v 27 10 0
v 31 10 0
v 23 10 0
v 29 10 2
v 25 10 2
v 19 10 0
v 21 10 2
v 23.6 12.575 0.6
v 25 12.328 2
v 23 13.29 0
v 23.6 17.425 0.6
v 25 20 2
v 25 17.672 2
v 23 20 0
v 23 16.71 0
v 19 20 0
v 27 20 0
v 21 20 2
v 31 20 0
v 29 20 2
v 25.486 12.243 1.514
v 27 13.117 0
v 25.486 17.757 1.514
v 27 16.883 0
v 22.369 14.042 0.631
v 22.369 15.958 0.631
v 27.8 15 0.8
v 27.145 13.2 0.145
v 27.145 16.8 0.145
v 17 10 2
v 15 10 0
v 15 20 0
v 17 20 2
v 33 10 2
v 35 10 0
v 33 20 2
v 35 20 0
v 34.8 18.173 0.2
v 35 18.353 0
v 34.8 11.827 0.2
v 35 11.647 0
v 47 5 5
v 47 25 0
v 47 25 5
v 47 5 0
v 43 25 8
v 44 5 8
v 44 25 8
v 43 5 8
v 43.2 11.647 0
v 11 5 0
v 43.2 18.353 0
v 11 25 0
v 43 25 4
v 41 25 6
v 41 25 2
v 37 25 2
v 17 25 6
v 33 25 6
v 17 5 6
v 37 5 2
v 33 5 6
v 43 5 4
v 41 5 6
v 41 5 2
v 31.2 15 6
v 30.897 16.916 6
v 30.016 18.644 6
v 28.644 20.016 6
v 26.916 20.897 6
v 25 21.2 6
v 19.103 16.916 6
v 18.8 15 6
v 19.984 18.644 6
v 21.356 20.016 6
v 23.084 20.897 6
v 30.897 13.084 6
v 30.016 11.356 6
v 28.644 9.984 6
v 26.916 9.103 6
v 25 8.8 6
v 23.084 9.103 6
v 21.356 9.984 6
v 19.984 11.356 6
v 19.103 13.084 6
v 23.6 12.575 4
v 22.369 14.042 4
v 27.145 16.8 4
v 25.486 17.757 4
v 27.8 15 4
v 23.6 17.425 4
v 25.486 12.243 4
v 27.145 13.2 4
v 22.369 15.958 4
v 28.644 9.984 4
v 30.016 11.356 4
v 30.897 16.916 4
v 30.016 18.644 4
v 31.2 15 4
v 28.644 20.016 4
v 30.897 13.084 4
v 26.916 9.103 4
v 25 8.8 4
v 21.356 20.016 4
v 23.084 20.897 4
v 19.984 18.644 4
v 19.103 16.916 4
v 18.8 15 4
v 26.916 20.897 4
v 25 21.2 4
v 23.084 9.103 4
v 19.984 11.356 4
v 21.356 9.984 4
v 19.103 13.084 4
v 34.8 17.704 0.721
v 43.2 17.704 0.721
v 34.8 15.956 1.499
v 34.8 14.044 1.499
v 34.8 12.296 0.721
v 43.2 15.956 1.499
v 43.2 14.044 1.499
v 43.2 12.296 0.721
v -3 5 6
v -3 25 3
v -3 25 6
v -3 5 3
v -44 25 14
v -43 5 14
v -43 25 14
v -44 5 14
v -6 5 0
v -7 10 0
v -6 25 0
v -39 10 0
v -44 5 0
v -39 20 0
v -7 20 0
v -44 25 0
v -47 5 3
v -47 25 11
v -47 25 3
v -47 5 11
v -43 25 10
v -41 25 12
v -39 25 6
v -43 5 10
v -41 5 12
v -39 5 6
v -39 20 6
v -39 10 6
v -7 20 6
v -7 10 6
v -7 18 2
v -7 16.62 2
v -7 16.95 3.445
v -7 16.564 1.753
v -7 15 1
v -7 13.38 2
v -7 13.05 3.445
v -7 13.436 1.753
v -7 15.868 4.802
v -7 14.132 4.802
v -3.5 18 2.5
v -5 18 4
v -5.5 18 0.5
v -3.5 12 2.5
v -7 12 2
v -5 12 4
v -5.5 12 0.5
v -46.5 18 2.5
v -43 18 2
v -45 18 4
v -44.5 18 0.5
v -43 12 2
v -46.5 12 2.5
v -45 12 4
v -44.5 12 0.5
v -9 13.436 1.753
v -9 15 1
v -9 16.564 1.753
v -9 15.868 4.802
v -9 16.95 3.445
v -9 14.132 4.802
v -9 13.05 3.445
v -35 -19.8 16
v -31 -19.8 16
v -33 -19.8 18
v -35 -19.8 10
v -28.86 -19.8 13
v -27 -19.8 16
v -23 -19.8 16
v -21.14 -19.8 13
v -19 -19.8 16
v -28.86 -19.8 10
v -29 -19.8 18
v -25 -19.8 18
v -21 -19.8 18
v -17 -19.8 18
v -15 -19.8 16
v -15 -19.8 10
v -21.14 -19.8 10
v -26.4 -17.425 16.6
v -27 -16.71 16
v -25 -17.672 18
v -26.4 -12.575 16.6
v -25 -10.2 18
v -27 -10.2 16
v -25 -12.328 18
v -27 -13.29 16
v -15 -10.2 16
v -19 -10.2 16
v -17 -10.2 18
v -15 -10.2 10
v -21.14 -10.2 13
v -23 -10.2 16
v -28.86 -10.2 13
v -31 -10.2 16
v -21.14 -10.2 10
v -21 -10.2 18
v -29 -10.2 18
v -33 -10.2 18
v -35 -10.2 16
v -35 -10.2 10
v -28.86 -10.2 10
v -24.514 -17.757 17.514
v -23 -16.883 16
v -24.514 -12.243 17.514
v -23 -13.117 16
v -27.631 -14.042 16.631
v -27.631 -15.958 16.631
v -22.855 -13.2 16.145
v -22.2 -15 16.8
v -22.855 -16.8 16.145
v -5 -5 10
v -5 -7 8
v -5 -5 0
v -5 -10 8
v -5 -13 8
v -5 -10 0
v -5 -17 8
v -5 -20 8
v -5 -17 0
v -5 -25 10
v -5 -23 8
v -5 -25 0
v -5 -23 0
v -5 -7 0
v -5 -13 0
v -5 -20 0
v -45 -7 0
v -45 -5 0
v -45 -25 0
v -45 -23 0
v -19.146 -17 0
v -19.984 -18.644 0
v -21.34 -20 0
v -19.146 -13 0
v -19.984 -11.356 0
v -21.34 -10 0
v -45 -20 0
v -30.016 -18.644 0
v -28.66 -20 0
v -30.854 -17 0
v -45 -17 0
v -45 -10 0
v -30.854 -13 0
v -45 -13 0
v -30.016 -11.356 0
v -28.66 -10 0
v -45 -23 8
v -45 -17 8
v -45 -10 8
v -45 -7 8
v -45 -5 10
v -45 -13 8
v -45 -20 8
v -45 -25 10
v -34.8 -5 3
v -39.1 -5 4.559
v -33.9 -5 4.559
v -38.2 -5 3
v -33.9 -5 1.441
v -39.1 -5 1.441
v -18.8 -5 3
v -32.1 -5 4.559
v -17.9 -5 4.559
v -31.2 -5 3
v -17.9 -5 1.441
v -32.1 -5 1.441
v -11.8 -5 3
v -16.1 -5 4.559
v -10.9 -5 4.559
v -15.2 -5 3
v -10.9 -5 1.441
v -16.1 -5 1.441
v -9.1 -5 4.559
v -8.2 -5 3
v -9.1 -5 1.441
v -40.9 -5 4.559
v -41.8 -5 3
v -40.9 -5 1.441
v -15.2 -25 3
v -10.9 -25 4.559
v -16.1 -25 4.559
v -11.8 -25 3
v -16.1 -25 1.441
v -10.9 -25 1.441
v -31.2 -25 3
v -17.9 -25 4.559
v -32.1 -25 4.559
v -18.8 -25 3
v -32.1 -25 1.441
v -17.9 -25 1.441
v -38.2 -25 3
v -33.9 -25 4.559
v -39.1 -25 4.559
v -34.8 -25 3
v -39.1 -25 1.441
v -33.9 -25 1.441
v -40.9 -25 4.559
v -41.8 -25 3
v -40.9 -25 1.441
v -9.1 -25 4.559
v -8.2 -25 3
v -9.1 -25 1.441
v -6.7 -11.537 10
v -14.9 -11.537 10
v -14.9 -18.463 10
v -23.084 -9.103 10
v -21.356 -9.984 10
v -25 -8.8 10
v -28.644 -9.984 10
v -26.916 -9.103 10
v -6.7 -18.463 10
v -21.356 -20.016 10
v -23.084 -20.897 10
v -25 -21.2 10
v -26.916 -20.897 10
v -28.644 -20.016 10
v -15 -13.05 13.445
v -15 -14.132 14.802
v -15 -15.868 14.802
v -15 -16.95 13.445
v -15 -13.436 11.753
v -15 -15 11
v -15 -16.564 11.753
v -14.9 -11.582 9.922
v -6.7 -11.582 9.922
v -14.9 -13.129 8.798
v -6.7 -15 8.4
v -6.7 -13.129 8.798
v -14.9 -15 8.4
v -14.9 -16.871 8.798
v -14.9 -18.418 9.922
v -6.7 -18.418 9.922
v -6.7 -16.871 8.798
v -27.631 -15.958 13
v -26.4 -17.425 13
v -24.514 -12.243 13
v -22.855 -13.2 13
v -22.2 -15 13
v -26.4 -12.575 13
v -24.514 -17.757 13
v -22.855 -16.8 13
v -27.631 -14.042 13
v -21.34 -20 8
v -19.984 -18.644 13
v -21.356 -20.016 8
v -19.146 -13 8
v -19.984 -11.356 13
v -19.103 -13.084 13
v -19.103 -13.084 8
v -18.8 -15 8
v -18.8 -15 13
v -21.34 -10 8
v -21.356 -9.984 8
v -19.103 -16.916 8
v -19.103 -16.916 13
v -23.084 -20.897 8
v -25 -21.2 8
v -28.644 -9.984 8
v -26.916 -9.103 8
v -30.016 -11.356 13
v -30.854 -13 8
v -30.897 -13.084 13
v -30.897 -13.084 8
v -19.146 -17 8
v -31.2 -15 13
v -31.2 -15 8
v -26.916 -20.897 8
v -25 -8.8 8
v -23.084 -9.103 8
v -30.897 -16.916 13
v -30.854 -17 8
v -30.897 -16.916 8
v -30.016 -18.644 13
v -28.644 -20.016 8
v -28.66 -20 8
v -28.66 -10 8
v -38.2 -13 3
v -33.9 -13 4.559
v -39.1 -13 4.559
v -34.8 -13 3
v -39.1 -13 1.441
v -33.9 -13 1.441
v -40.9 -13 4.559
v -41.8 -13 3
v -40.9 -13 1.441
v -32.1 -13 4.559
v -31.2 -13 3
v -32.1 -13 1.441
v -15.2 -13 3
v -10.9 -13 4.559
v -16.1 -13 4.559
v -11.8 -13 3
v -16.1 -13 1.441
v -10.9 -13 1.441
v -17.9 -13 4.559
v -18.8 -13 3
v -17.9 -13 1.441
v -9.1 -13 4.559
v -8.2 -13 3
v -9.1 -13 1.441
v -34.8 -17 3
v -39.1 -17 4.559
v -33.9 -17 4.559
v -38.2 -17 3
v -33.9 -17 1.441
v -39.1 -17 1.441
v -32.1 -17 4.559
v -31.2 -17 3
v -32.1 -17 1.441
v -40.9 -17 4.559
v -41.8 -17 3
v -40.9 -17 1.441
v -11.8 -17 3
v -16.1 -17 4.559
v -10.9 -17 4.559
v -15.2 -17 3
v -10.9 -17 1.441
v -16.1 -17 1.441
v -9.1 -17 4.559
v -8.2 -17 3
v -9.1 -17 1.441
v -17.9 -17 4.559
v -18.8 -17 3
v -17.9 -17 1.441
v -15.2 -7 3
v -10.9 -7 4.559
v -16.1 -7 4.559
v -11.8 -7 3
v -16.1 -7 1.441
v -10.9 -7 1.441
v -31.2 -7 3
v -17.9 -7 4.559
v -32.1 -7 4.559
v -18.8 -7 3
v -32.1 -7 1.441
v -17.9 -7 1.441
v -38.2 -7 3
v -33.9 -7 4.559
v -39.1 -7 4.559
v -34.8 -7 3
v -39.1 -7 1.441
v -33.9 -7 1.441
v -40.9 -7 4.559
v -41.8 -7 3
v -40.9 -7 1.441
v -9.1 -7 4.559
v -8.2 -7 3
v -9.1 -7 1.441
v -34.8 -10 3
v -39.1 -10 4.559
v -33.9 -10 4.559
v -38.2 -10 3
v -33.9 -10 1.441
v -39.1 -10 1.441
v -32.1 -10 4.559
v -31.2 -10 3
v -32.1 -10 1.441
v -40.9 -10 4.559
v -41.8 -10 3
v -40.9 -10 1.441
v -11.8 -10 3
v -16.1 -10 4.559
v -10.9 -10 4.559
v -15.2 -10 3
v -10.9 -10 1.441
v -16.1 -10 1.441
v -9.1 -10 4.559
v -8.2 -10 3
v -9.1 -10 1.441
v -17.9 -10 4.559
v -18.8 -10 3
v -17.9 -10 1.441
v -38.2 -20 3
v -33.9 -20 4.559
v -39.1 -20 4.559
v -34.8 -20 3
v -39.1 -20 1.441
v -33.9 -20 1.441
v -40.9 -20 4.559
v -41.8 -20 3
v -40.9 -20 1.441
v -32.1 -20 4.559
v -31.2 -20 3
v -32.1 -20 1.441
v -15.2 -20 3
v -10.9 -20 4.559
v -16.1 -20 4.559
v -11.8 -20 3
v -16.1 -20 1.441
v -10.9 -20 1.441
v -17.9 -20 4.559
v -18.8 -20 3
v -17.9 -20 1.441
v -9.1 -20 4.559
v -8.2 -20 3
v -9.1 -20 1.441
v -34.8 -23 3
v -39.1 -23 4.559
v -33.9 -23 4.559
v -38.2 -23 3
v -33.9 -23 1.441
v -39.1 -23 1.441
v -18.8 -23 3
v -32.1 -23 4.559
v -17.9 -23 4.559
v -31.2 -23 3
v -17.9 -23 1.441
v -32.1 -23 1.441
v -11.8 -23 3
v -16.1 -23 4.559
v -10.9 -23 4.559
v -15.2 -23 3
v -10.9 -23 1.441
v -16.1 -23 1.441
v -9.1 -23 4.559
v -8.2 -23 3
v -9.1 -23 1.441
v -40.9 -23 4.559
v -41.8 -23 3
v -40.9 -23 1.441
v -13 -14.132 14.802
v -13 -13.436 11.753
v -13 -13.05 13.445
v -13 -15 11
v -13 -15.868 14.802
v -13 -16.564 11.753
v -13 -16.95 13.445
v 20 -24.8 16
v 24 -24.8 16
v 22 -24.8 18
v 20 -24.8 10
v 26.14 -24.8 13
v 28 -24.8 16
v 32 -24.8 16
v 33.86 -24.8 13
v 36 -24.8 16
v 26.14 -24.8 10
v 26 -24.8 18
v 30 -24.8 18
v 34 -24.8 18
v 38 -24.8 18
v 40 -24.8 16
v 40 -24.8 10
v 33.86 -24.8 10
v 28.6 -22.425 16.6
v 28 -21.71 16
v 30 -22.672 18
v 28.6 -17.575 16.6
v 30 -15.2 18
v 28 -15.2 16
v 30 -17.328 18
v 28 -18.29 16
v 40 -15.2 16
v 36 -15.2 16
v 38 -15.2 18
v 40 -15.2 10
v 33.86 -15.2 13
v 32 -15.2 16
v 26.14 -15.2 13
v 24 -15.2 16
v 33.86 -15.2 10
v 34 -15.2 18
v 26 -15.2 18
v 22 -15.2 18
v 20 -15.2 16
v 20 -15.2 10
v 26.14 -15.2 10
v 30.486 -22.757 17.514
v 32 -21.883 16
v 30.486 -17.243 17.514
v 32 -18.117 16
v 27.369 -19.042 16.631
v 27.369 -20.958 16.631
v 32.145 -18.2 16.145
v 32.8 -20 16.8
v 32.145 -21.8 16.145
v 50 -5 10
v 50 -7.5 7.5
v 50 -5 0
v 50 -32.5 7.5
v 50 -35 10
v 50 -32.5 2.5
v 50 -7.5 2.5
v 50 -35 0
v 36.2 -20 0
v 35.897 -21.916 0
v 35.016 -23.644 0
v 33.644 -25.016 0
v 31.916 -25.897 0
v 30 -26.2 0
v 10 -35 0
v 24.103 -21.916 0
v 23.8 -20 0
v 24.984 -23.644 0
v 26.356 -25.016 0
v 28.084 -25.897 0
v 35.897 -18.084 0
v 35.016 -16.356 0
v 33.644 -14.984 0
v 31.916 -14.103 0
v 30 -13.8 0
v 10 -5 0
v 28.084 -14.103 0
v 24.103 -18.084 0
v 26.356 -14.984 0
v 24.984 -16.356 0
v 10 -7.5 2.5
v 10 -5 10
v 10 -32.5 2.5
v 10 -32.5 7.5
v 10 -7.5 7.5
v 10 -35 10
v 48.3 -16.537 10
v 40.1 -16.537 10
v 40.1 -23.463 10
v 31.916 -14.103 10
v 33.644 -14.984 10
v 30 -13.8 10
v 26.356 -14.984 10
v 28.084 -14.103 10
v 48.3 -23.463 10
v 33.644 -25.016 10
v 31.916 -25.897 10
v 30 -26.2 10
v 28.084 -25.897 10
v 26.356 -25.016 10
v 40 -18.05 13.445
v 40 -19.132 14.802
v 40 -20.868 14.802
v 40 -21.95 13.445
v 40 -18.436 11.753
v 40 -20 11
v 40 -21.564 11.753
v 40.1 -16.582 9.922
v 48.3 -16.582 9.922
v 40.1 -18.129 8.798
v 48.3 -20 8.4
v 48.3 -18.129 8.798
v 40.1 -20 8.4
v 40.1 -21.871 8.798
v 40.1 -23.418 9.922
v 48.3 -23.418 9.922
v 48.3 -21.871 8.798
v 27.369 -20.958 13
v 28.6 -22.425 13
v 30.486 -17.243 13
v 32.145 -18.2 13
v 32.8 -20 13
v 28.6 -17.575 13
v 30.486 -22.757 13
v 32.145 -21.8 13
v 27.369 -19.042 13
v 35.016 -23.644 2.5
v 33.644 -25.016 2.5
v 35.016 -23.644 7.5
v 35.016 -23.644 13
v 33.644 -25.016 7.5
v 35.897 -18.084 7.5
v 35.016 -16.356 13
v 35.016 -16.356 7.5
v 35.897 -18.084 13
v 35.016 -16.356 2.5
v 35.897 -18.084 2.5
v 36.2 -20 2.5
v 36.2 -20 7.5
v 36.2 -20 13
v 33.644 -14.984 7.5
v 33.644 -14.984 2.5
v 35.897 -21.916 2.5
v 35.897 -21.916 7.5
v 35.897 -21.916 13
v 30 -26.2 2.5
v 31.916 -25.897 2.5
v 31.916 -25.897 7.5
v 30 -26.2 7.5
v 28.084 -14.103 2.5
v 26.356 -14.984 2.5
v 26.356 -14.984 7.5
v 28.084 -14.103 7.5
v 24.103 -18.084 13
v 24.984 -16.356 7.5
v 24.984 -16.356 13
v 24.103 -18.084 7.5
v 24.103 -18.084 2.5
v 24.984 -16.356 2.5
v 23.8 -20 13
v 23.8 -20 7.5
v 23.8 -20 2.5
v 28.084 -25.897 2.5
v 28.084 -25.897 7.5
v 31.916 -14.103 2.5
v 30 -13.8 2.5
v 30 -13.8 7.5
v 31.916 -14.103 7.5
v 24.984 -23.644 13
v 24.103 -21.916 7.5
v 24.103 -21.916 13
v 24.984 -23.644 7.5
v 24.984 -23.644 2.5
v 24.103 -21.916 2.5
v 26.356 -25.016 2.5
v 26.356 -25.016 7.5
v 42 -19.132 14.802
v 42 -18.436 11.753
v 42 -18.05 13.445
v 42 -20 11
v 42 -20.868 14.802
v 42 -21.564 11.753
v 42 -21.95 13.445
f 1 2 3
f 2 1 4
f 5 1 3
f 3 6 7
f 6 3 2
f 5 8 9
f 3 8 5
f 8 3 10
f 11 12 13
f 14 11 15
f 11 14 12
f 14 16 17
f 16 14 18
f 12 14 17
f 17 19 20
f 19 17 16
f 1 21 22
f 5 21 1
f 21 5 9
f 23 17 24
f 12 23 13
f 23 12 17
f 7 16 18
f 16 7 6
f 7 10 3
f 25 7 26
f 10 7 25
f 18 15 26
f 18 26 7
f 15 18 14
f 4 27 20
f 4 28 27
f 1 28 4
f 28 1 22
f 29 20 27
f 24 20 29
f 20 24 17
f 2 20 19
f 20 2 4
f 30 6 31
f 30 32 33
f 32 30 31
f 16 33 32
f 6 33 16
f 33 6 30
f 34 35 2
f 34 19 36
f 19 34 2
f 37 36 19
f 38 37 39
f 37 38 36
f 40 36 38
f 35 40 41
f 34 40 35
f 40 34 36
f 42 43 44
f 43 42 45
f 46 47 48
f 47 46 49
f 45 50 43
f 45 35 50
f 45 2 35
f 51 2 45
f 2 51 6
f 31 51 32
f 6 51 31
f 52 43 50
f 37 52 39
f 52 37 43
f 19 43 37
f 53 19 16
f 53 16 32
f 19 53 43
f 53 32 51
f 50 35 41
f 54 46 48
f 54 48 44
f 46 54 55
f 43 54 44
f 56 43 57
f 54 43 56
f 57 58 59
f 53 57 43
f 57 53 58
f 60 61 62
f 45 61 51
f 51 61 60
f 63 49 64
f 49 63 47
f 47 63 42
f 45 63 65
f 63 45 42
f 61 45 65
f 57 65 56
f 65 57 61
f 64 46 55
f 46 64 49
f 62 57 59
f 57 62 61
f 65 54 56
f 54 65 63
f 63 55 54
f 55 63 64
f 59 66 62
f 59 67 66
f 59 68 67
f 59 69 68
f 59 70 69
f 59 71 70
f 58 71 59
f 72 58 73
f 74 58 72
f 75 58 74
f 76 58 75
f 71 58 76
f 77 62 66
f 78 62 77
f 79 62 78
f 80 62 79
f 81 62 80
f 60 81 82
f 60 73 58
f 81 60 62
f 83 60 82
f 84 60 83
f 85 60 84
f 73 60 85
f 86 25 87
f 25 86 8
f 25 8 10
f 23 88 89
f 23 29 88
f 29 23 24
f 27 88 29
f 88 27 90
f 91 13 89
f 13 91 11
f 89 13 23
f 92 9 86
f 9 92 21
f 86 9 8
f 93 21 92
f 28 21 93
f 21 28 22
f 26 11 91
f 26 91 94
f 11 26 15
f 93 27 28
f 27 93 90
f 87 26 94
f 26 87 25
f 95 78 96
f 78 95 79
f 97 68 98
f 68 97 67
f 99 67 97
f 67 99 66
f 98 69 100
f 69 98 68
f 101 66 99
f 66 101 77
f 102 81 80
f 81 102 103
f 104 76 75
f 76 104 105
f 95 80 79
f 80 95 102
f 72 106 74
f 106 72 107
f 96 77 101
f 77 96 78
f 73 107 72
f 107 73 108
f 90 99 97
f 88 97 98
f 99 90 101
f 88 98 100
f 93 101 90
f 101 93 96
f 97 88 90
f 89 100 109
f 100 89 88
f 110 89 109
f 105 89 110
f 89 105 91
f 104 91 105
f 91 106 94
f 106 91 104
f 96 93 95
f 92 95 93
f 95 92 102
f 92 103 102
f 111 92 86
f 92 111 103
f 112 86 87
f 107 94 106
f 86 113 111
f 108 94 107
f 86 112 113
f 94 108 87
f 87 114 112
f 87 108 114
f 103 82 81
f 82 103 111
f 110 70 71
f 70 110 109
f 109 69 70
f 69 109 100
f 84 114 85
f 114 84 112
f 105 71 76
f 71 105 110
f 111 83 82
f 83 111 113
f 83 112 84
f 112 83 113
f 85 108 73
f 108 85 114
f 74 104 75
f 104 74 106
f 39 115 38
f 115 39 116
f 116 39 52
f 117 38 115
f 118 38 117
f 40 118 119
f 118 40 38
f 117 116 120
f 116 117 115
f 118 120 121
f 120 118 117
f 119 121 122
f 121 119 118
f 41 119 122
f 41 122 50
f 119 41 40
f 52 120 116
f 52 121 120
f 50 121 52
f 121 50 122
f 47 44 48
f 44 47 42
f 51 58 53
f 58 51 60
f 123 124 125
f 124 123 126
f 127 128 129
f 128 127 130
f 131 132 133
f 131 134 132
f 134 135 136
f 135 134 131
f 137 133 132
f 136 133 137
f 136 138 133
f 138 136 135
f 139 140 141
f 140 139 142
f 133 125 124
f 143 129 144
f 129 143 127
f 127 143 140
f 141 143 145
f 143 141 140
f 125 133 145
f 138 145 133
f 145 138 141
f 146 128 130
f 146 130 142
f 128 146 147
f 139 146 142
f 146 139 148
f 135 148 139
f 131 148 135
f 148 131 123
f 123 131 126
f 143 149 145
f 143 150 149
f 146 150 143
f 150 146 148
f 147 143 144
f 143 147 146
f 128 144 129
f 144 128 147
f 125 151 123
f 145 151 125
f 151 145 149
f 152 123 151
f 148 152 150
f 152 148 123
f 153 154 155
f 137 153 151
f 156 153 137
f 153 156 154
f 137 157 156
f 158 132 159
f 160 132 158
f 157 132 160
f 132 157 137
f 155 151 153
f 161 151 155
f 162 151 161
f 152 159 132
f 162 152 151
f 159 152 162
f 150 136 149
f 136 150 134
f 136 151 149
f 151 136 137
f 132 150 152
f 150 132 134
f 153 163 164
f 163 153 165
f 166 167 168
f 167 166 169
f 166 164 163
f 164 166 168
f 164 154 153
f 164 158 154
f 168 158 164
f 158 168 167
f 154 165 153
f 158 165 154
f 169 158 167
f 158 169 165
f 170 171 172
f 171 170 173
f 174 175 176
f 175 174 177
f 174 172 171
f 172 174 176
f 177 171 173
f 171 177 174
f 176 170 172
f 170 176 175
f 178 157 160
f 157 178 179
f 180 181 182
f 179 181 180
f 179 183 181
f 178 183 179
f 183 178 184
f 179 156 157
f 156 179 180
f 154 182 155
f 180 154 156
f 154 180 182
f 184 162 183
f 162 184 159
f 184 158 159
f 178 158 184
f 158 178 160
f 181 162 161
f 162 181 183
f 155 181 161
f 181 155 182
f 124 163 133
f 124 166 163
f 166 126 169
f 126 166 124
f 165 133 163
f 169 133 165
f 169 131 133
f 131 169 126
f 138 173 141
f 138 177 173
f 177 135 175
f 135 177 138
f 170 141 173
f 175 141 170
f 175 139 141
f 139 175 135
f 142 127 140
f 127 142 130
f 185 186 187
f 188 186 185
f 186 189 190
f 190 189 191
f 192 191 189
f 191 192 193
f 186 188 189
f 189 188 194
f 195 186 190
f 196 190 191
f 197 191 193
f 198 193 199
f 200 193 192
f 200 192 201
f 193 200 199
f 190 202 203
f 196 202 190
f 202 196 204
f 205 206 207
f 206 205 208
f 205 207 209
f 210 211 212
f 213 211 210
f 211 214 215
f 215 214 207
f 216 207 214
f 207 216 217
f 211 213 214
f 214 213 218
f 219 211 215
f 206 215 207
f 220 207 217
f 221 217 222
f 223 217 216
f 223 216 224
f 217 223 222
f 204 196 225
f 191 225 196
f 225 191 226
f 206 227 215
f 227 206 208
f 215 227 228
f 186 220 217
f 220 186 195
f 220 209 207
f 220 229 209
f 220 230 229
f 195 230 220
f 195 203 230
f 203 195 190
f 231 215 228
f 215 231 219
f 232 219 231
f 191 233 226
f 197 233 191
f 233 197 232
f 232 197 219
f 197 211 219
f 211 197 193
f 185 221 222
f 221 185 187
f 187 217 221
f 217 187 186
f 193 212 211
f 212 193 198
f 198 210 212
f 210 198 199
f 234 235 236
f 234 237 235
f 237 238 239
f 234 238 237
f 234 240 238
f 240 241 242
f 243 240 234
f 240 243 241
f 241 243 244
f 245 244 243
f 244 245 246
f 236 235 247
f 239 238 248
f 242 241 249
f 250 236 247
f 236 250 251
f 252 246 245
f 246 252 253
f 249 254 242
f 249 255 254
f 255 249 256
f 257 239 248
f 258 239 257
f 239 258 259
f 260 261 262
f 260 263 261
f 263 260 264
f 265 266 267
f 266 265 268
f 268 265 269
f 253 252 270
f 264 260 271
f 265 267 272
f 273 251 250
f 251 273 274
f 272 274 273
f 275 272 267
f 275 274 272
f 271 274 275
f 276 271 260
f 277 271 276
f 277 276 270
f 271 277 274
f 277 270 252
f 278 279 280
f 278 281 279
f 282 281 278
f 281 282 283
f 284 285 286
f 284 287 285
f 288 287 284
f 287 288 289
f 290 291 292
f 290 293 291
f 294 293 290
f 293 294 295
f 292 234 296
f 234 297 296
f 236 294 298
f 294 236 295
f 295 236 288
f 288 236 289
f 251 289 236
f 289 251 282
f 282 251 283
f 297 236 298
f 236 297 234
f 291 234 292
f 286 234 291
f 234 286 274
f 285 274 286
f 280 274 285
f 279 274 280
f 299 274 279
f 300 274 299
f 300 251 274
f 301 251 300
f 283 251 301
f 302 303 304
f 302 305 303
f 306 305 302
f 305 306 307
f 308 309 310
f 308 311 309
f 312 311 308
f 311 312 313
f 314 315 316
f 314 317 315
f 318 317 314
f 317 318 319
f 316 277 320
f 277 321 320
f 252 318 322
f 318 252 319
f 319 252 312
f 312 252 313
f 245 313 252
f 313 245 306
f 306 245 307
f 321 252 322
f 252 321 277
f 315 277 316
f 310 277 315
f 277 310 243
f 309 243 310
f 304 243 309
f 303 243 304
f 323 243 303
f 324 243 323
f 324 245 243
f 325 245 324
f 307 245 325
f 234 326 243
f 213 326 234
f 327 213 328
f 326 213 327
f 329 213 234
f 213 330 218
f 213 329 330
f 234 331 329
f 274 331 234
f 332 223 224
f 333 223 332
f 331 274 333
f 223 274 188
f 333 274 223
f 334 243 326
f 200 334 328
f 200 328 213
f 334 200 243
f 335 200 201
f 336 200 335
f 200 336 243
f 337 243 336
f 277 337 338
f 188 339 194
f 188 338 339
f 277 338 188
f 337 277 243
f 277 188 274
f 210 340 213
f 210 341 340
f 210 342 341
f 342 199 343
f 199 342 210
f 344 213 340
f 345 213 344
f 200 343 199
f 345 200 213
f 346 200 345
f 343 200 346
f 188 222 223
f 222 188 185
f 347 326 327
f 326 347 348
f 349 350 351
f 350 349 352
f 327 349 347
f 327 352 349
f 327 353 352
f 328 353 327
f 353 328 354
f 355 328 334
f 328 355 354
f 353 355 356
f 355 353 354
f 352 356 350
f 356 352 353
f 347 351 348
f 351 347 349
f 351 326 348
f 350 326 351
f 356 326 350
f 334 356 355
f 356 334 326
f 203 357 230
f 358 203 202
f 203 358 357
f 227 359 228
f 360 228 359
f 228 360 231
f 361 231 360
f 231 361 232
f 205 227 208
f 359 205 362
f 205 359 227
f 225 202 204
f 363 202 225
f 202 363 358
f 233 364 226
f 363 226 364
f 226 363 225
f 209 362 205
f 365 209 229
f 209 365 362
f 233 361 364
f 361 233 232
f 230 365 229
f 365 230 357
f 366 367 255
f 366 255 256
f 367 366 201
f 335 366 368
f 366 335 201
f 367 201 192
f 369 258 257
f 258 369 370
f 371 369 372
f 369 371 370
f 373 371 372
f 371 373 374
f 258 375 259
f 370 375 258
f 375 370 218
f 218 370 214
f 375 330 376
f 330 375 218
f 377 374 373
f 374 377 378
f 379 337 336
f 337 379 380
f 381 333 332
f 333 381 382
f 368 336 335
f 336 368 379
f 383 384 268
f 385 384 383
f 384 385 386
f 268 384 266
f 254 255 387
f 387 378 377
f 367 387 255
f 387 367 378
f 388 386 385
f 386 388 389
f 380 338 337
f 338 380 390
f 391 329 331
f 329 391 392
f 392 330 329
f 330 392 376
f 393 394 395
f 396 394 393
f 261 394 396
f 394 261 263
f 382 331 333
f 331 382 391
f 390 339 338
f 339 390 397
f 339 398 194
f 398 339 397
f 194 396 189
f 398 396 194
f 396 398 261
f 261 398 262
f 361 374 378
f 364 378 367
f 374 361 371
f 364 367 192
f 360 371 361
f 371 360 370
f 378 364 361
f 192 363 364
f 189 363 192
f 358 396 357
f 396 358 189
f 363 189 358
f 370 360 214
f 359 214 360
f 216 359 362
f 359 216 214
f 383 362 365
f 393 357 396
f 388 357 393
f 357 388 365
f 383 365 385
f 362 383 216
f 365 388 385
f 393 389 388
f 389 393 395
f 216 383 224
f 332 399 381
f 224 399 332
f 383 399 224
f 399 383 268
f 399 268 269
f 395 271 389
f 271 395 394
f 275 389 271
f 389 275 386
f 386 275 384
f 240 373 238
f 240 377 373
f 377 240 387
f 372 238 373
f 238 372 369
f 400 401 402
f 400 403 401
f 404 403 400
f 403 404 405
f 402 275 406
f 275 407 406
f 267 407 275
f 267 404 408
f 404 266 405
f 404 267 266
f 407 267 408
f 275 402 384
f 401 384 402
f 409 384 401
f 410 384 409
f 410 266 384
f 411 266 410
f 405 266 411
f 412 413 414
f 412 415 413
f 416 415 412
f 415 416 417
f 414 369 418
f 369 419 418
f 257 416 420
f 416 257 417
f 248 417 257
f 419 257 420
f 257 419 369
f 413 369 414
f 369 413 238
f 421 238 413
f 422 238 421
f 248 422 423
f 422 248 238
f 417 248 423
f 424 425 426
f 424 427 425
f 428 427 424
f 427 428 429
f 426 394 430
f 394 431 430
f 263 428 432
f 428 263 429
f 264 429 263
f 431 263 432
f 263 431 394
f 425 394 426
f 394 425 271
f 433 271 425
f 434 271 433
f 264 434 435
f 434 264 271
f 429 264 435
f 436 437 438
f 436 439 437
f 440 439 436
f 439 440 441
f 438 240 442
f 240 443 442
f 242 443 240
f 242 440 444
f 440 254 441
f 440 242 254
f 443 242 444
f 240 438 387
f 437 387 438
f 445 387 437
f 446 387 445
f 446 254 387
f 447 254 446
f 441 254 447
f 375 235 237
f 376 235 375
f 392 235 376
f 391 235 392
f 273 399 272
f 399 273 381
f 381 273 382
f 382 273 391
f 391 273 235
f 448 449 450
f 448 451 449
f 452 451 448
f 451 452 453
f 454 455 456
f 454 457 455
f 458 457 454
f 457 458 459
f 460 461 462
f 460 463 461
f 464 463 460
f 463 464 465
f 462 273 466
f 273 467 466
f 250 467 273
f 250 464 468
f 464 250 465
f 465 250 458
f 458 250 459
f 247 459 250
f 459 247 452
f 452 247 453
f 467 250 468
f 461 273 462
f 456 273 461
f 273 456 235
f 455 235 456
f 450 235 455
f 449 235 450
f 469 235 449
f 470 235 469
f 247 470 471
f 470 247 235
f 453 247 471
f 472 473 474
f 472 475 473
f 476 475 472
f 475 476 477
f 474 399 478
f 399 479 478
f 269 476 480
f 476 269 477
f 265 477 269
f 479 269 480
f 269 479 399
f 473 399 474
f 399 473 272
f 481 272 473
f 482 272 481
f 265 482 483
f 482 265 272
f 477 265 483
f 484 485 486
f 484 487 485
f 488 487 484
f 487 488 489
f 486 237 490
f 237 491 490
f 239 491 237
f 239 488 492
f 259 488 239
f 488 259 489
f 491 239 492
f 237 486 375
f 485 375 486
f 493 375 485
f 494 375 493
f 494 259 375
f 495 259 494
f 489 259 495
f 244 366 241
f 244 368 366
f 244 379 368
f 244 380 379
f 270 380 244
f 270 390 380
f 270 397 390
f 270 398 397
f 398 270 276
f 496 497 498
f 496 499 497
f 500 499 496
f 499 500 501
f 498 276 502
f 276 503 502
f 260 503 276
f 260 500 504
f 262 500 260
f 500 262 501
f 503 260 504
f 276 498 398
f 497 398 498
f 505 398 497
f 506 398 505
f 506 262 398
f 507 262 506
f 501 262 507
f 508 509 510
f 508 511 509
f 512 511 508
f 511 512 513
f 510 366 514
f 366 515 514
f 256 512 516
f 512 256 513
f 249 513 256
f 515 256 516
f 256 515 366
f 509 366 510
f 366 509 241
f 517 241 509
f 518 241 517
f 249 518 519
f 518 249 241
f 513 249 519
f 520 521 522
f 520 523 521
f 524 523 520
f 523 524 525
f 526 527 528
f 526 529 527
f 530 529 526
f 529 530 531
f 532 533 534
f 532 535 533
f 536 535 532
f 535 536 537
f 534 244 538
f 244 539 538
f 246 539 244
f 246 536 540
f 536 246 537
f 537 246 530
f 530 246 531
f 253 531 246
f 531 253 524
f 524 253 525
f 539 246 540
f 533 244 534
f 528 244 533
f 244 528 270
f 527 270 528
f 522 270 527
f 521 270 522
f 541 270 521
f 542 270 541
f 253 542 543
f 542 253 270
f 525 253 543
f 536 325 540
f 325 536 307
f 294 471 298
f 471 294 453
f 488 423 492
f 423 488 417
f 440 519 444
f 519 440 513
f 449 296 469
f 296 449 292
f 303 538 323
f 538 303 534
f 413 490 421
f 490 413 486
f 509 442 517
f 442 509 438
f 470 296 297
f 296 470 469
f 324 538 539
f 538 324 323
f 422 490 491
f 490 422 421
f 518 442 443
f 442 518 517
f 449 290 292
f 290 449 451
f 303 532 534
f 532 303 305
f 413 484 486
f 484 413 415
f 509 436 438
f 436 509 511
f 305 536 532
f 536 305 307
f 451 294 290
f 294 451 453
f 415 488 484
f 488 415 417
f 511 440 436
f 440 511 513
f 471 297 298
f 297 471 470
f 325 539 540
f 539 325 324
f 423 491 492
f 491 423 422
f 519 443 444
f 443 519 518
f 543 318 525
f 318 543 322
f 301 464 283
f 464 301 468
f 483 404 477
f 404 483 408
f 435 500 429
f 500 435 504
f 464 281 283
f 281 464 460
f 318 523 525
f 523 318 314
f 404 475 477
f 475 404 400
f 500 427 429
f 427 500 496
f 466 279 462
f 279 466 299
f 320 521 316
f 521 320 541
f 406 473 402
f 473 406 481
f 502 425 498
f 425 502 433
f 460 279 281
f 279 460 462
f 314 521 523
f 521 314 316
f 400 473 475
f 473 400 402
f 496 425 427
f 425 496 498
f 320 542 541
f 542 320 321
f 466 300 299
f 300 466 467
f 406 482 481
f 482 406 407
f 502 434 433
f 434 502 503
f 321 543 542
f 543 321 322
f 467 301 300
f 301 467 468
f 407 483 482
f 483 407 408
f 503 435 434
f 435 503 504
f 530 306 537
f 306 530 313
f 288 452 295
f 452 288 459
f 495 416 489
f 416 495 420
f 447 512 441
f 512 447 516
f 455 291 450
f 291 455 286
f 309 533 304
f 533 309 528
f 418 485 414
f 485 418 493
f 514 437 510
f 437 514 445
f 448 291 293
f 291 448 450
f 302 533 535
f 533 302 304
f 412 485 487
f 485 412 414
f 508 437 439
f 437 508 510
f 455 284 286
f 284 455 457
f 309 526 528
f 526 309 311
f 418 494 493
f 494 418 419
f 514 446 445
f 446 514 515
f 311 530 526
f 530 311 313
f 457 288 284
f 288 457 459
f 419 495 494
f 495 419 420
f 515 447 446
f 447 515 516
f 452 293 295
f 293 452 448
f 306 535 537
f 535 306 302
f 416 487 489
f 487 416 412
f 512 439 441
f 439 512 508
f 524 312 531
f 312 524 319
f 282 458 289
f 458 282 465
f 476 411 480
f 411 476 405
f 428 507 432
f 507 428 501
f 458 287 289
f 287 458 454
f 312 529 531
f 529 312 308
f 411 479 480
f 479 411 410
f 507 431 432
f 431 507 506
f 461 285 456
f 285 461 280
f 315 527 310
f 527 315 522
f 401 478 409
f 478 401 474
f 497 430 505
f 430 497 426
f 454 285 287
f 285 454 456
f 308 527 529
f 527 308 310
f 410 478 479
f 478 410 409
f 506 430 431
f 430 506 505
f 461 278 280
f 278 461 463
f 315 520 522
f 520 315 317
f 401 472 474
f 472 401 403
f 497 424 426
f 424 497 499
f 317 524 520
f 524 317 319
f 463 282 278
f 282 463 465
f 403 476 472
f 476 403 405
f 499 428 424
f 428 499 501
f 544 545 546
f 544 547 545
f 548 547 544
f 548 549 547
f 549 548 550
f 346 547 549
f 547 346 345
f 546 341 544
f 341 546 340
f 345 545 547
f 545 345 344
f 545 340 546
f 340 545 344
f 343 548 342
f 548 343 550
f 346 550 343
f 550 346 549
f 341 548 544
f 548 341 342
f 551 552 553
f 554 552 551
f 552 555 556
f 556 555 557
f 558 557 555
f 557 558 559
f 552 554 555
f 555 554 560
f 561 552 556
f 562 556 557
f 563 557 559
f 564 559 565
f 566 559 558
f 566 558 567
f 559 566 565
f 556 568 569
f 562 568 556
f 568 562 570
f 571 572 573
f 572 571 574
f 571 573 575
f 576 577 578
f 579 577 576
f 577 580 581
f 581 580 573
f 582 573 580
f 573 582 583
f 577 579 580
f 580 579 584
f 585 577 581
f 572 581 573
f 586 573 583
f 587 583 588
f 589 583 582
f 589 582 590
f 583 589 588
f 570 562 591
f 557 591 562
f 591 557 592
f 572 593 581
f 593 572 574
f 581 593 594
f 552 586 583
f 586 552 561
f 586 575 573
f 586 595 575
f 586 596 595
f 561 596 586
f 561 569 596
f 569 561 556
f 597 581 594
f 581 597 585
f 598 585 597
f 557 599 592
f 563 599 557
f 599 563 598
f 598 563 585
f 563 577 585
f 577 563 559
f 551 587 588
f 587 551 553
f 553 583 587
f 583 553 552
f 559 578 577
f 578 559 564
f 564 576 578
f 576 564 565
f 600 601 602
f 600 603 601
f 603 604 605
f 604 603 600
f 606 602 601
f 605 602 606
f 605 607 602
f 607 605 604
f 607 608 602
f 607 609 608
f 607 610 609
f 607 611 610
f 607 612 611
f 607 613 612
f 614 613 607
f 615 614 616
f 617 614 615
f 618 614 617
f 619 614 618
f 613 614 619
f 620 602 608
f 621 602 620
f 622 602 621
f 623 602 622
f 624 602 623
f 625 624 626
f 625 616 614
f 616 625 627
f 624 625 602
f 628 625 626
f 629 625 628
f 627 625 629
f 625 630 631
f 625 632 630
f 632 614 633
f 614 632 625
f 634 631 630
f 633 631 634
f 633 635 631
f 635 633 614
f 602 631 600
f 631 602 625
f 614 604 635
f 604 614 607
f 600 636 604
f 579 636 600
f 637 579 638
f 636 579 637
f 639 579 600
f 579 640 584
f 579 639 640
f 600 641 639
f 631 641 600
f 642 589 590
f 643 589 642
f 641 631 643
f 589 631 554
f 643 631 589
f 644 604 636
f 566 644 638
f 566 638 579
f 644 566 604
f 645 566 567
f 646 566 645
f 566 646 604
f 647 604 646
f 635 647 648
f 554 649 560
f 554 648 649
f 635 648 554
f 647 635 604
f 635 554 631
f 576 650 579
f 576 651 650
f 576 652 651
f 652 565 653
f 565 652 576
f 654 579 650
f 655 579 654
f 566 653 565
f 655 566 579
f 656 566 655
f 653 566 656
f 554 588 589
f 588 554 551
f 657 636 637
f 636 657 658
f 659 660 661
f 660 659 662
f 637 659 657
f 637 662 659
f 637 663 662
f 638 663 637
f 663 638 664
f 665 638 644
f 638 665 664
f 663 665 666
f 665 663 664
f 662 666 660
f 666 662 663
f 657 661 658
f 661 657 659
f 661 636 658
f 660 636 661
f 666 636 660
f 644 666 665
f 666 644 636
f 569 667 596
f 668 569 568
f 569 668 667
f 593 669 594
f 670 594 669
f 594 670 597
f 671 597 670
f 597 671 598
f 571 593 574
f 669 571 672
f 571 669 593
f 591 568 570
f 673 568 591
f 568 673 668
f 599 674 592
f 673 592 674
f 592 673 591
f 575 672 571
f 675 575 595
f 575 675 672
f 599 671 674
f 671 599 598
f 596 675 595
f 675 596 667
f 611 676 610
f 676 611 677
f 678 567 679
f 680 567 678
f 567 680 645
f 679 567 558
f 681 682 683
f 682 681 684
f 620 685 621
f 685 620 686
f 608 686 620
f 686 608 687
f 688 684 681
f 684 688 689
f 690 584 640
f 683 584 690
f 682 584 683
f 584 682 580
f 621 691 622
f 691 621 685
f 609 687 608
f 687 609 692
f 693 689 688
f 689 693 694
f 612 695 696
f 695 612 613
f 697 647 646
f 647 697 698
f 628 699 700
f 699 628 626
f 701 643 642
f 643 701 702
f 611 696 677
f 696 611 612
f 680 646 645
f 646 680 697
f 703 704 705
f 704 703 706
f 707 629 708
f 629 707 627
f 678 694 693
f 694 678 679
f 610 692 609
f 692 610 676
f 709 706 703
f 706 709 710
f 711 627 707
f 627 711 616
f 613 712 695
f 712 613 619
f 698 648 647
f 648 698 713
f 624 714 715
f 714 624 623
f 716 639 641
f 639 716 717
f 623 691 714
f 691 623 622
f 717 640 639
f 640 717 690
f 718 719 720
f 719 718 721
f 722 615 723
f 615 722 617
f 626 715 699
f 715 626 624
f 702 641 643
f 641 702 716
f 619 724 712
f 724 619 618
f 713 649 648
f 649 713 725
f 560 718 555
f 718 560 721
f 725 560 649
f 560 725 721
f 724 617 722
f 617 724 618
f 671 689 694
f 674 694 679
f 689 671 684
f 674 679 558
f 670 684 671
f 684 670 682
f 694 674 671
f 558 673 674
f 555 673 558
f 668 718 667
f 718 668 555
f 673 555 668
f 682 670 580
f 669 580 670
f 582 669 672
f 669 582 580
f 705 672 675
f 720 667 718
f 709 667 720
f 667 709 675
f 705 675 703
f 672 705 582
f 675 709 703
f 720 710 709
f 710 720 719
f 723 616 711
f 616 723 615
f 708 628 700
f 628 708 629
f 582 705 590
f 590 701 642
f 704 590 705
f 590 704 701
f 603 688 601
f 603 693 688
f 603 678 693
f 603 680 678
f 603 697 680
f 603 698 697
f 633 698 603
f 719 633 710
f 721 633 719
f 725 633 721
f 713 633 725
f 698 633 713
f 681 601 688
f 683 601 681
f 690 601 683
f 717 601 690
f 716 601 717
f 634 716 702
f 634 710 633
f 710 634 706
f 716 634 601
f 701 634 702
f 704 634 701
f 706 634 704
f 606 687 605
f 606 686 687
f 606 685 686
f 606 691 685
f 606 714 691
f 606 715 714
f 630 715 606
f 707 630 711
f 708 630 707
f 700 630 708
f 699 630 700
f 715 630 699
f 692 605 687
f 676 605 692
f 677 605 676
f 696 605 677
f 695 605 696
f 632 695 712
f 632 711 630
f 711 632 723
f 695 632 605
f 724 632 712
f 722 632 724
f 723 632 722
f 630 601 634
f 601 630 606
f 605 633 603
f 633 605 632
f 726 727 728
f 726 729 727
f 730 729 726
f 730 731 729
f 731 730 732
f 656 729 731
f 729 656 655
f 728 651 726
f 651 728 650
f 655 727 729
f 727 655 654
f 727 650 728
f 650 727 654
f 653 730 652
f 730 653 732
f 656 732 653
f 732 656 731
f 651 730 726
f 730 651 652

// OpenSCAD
union () {
  translate ([25, 15, 4]) {
    intersection () {
      difference () {
        cube ([44, 20, 8], center=true);
        translate ([14, 0, 0]) {
          cube ([4, 20, 4], center=true);
        }
        translate ([12, 0, 4]) {
          rotate (a=45.0, v=[0, 1, 0]) {
            cube ([8.48528137423857, 20, 8.48528137423857], center=true);
          }
        }
        translate ([16, 0, 0]) {
          rotate (a=45.0, v=[0, 1, 0]) {
            cube ([2.8284271247461903, 20, 2.8284271247461903], center=true);
          }
        }
        translate ([0, 0, 3]) {
          cube ([20, 20, 2], center=true);
        }
        cylinder (h=8, r=2.8, center=true);
        translate ([0, 0, 1]) {
          cylinder (h=2, r=6.2, center=true);
        }
        translate ([0, 0, -4]) {
          rotate (a=90.0, v=[1, 0, 0]) {
            union () {
              rotate (a=45.0, v=[0, 0, 1]) {
                cube ([2.8284271247461903, 2.8284271247461903, 10], center=true);
              }
              translate ([-4, 0, 0]) {
                rotate (a=45.0, v=[0, 0, 1]) {
                  cube ([2.8284271247461903, 2.8284271247461903, 10], center=true);
                }
              }
              translate ([4, 0, 0]) {
                rotate (a=45.0, v=[0, 0, 1]) {
                  cube ([2.8284271247461903, 2.8284271247461903, 10], center=true);
                }
              }
              translate ([-8, 0, 0]) {
                rotate (a=45.0, v=[0, 0, 1]) {
                  cube ([2.8284271247461903, 2.8284271247461903, 10], center=true);
                }
              }
              translate ([8, 0, 0]) {
                rotate (a=45.0, v=[0, 0, 1]) {
                  cube ([2.8284271247461903, 2.8284271247461903, 10], center=true);
                }
              }
            }
          }
        }
        translate ([14, 0, -7]) {
          rotate (a=90.0, v=[0, 1, 0]) {
            cylinder (h=8.4, r=4.6, center=true);
          }
        }
      }
      translate ([6.5, 0, -4]) {
        rotate (a=45.0, v=[0, 1, 0]) {
          cube ([28.991378028648448, 20, 28.991378028648448], center=true);
        }
      }
    }
  }
  translate ([-25, 15, 7]) {
    intersection () {
      union () {
        difference () {
          cube ([44, 20, 14], center=true);
          translate ([-14, 0, 3]) {
            rotate (a=45.0, v=[0, 1, 0]) {
              cube ([5.656854249492381, 20, 5.656854249492381], center=true);
            }
          }
          translate ([-10, 0, 7]) {
            rotate (a=45.0, v=[0, 1, 0]) {
              cube ([11.313708498984761, 20, 11.313708498984761], center=true);
            }
          }
          translate ([4, 0, 3]) {
            cube ([36, 20, 8], center=true);
          }
          translate ([2, 0, -4]) {
            cube ([32, 10, 6], center=true);
          }
          translate ([20, 0, -5]) {
            rotate (a=45.0, v=[0, 1, 0]) {
              cube ([2.8284271247461903, 6, 2.8284271247461903], center=true);
            }
          }
          translate ([-20, 0, -5]) {
            rotate (a=45.0, v=[0, 1, 0]) {
              cube ([2.8284271247461903, 6, 2.8284271247461903], center=true);
            }
          }
        }
        translate ([17, 0, -4]) {
          rotate (a=90.0, v=[0, 1, 0]) {
            cylinder (h=2, r=2, center=true);
          }
        }
      }
      rotate (a=45.0, v=[0, 1, 0]) {
        cube ([36.76955262170047, 20, 36.76955262170047], center=true);
      }
    }
  }
  translate ([-25, -15, 8]) {
    union () {
      difference () {
        union () {
          cube ([40, 20, 16], center=true);
          translate ([0, 0, 8]) {
            rotate (a=90.0, v=[1, 0, 0]) {
              union () {
                rotate (a=45.0, v=[0, 0, 1]) {
                  cube ([2.8284271247461903, 2.8284271247461903, 9.6], center=true);
                }
                translate ([-4, 0, 0]) {
                  rotate (a=45.0, v=[0, 0, 1]) {
                    cube ([2.8284271247461903, 2.8284271247461903, 9.6], center=true);
                  }
                }
                translate ([4, 0, 0]) {
                  rotate (a=45.0, v=[0, 0, 1]) {
                    cube ([2.8284271247461903, 2.8284271247461903, 9.6], center=true);
                  }
                }
                translate ([-8, 0, 0]) {
                  rotate (a=45.0, v=[0, 0, 1]) {
                    cube ([2.8284271247461903, 2.8284271247461903, 9.6], center=true);
                  }
                }
                translate ([8, 0, 0]) {
                  rotate (a=45.0, v=[0, 0, 1]) {
                    cube ([2.8284271247461903, 2.8284271247461903, 9.6], center=true);
                  }
                }
              }
            }
          }
        }
        translate ([0, 0, 5]) {
          difference () {
            cube ([40, 20, 6], center=true);
            cube ([20, 9.6, 6], center=true);
          }
        }
        translate ([14.2, 0, 5]) {
          rotate (a=90.0, v=[0, 1, 0]) {
            cylinder (h=8.2, r=4.6, center=true);
          }
        }
        cylinder (h=20, r=2.8, center=true);
        translate ([0, 0, -1.5]) {
          cylinder (h=13, r=6.2, center=true);
        }
        translate ([0, 0, -4]) {
          cube ([40, 4, 8], center=true);
        }
        translate ([0, 6.5, -4]) {
          cube ([40, 3, 8], center=true);
        }
        translate ([0, -6.5, -4]) {
          cube ([40, 3, 8], center=true);
        }
        translate ([15, 0, -5]) {
          rotate (a=90.0, v=[1, 0, 0]) {
            cylinder (h=20, r=1.8, center=true);
          }
        }
        translate ([-15, 0, -5]) {
          rotate (a=90.0, v=[1, 0, 0]) {
            cylinder (h=20, r=1.8, center=true);
          }
        }
        translate ([8, 0, -5]) {
          rotate (a=90.0, v=[1, 0, 0]) {
            cylinder (h=20, r=1.8, center=true);
          }
        }
        translate ([-8, 0, -5]) {
          rotate (a=90.0, v=[1, 0, 0]) {
            cylinder (h=20, r=1.8, center=true);
          }
        }
      }
      translate ([11, 0, 5]) {
        rotate (a=90.0, v=[0, 1, 0]) {
          cylinder (h=2, r=2, center=true);
        }
      }
    }
  }
  translate ([30, -20, 8]) {
    union () {
      difference () {
        union () {
          cube ([40, 30, 16], center=true);
          translate ([0, 0, 8]) {
            rotate (a=90.0, v=[1, 0, 0]) {
              union () {
                rotate (a=45.0, v=[0, 0, 1]) {
                  cube ([2.8284271247461903, 2.8284271247461903, 9.6], center=true);
                }
                translate ([-4, 0, 0]) {
                  rotate (a=45.0, v=[0, 0, 1]) {
                    cube ([2.8284271247461903, 2.8284271247461903, 9.6], center=true);
                  }
                }
                translate ([4, 0, 0]) {
                  rotate (a=45.0, v=[0, 0, 1]) {
                    cube ([2.8284271247461903, 2.8284271247461903, 9.6], center=true);
                  }
                }
                translate ([-8, 0, 0]) {
                  rotate (a=45.0, v=[0, 0, 1]) {
                    cube ([2.8284271247461903, 2.8284271247461903, 9.6], center=true);
                  }
                }
                translate ([8, 0, 0]) {
                  rotate (a=45.0, v=[0, 0, 1]) {
                    cube ([2.8284271247461903, 2.8284271247461903, 9.6], center=true);
                  }
                }
              }
            }
          }
        }
        translate ([0, 0, 5]) {
          difference () {
            cube ([40, 30, 6], center=true);
            cube ([20, 9.6, 6], center=true);
          }
        }
        translate ([14.2, 0, 5]) {
          rotate (a=90.0, v=[0, 1, 0]) {
            cylinder (h=8.2, r=4.6, center=true);
          }
        }
        cylinder (h=20, r=2.8, center=true);
        translate ([0, 0, -1.5]) {
          cylinder (h=13, r=6.2, center=true);
        }
        translate ([0, 0, -3]) {
          cube ([40, 25, 5], center=true);
        }
      }
      translate ([11, 0, 5]) {
        rotate (a=90.0, v=[0, 1, 0]) {
          cylinder (h=2, r=2, center=true);
        }
      }
    }
  }
}
